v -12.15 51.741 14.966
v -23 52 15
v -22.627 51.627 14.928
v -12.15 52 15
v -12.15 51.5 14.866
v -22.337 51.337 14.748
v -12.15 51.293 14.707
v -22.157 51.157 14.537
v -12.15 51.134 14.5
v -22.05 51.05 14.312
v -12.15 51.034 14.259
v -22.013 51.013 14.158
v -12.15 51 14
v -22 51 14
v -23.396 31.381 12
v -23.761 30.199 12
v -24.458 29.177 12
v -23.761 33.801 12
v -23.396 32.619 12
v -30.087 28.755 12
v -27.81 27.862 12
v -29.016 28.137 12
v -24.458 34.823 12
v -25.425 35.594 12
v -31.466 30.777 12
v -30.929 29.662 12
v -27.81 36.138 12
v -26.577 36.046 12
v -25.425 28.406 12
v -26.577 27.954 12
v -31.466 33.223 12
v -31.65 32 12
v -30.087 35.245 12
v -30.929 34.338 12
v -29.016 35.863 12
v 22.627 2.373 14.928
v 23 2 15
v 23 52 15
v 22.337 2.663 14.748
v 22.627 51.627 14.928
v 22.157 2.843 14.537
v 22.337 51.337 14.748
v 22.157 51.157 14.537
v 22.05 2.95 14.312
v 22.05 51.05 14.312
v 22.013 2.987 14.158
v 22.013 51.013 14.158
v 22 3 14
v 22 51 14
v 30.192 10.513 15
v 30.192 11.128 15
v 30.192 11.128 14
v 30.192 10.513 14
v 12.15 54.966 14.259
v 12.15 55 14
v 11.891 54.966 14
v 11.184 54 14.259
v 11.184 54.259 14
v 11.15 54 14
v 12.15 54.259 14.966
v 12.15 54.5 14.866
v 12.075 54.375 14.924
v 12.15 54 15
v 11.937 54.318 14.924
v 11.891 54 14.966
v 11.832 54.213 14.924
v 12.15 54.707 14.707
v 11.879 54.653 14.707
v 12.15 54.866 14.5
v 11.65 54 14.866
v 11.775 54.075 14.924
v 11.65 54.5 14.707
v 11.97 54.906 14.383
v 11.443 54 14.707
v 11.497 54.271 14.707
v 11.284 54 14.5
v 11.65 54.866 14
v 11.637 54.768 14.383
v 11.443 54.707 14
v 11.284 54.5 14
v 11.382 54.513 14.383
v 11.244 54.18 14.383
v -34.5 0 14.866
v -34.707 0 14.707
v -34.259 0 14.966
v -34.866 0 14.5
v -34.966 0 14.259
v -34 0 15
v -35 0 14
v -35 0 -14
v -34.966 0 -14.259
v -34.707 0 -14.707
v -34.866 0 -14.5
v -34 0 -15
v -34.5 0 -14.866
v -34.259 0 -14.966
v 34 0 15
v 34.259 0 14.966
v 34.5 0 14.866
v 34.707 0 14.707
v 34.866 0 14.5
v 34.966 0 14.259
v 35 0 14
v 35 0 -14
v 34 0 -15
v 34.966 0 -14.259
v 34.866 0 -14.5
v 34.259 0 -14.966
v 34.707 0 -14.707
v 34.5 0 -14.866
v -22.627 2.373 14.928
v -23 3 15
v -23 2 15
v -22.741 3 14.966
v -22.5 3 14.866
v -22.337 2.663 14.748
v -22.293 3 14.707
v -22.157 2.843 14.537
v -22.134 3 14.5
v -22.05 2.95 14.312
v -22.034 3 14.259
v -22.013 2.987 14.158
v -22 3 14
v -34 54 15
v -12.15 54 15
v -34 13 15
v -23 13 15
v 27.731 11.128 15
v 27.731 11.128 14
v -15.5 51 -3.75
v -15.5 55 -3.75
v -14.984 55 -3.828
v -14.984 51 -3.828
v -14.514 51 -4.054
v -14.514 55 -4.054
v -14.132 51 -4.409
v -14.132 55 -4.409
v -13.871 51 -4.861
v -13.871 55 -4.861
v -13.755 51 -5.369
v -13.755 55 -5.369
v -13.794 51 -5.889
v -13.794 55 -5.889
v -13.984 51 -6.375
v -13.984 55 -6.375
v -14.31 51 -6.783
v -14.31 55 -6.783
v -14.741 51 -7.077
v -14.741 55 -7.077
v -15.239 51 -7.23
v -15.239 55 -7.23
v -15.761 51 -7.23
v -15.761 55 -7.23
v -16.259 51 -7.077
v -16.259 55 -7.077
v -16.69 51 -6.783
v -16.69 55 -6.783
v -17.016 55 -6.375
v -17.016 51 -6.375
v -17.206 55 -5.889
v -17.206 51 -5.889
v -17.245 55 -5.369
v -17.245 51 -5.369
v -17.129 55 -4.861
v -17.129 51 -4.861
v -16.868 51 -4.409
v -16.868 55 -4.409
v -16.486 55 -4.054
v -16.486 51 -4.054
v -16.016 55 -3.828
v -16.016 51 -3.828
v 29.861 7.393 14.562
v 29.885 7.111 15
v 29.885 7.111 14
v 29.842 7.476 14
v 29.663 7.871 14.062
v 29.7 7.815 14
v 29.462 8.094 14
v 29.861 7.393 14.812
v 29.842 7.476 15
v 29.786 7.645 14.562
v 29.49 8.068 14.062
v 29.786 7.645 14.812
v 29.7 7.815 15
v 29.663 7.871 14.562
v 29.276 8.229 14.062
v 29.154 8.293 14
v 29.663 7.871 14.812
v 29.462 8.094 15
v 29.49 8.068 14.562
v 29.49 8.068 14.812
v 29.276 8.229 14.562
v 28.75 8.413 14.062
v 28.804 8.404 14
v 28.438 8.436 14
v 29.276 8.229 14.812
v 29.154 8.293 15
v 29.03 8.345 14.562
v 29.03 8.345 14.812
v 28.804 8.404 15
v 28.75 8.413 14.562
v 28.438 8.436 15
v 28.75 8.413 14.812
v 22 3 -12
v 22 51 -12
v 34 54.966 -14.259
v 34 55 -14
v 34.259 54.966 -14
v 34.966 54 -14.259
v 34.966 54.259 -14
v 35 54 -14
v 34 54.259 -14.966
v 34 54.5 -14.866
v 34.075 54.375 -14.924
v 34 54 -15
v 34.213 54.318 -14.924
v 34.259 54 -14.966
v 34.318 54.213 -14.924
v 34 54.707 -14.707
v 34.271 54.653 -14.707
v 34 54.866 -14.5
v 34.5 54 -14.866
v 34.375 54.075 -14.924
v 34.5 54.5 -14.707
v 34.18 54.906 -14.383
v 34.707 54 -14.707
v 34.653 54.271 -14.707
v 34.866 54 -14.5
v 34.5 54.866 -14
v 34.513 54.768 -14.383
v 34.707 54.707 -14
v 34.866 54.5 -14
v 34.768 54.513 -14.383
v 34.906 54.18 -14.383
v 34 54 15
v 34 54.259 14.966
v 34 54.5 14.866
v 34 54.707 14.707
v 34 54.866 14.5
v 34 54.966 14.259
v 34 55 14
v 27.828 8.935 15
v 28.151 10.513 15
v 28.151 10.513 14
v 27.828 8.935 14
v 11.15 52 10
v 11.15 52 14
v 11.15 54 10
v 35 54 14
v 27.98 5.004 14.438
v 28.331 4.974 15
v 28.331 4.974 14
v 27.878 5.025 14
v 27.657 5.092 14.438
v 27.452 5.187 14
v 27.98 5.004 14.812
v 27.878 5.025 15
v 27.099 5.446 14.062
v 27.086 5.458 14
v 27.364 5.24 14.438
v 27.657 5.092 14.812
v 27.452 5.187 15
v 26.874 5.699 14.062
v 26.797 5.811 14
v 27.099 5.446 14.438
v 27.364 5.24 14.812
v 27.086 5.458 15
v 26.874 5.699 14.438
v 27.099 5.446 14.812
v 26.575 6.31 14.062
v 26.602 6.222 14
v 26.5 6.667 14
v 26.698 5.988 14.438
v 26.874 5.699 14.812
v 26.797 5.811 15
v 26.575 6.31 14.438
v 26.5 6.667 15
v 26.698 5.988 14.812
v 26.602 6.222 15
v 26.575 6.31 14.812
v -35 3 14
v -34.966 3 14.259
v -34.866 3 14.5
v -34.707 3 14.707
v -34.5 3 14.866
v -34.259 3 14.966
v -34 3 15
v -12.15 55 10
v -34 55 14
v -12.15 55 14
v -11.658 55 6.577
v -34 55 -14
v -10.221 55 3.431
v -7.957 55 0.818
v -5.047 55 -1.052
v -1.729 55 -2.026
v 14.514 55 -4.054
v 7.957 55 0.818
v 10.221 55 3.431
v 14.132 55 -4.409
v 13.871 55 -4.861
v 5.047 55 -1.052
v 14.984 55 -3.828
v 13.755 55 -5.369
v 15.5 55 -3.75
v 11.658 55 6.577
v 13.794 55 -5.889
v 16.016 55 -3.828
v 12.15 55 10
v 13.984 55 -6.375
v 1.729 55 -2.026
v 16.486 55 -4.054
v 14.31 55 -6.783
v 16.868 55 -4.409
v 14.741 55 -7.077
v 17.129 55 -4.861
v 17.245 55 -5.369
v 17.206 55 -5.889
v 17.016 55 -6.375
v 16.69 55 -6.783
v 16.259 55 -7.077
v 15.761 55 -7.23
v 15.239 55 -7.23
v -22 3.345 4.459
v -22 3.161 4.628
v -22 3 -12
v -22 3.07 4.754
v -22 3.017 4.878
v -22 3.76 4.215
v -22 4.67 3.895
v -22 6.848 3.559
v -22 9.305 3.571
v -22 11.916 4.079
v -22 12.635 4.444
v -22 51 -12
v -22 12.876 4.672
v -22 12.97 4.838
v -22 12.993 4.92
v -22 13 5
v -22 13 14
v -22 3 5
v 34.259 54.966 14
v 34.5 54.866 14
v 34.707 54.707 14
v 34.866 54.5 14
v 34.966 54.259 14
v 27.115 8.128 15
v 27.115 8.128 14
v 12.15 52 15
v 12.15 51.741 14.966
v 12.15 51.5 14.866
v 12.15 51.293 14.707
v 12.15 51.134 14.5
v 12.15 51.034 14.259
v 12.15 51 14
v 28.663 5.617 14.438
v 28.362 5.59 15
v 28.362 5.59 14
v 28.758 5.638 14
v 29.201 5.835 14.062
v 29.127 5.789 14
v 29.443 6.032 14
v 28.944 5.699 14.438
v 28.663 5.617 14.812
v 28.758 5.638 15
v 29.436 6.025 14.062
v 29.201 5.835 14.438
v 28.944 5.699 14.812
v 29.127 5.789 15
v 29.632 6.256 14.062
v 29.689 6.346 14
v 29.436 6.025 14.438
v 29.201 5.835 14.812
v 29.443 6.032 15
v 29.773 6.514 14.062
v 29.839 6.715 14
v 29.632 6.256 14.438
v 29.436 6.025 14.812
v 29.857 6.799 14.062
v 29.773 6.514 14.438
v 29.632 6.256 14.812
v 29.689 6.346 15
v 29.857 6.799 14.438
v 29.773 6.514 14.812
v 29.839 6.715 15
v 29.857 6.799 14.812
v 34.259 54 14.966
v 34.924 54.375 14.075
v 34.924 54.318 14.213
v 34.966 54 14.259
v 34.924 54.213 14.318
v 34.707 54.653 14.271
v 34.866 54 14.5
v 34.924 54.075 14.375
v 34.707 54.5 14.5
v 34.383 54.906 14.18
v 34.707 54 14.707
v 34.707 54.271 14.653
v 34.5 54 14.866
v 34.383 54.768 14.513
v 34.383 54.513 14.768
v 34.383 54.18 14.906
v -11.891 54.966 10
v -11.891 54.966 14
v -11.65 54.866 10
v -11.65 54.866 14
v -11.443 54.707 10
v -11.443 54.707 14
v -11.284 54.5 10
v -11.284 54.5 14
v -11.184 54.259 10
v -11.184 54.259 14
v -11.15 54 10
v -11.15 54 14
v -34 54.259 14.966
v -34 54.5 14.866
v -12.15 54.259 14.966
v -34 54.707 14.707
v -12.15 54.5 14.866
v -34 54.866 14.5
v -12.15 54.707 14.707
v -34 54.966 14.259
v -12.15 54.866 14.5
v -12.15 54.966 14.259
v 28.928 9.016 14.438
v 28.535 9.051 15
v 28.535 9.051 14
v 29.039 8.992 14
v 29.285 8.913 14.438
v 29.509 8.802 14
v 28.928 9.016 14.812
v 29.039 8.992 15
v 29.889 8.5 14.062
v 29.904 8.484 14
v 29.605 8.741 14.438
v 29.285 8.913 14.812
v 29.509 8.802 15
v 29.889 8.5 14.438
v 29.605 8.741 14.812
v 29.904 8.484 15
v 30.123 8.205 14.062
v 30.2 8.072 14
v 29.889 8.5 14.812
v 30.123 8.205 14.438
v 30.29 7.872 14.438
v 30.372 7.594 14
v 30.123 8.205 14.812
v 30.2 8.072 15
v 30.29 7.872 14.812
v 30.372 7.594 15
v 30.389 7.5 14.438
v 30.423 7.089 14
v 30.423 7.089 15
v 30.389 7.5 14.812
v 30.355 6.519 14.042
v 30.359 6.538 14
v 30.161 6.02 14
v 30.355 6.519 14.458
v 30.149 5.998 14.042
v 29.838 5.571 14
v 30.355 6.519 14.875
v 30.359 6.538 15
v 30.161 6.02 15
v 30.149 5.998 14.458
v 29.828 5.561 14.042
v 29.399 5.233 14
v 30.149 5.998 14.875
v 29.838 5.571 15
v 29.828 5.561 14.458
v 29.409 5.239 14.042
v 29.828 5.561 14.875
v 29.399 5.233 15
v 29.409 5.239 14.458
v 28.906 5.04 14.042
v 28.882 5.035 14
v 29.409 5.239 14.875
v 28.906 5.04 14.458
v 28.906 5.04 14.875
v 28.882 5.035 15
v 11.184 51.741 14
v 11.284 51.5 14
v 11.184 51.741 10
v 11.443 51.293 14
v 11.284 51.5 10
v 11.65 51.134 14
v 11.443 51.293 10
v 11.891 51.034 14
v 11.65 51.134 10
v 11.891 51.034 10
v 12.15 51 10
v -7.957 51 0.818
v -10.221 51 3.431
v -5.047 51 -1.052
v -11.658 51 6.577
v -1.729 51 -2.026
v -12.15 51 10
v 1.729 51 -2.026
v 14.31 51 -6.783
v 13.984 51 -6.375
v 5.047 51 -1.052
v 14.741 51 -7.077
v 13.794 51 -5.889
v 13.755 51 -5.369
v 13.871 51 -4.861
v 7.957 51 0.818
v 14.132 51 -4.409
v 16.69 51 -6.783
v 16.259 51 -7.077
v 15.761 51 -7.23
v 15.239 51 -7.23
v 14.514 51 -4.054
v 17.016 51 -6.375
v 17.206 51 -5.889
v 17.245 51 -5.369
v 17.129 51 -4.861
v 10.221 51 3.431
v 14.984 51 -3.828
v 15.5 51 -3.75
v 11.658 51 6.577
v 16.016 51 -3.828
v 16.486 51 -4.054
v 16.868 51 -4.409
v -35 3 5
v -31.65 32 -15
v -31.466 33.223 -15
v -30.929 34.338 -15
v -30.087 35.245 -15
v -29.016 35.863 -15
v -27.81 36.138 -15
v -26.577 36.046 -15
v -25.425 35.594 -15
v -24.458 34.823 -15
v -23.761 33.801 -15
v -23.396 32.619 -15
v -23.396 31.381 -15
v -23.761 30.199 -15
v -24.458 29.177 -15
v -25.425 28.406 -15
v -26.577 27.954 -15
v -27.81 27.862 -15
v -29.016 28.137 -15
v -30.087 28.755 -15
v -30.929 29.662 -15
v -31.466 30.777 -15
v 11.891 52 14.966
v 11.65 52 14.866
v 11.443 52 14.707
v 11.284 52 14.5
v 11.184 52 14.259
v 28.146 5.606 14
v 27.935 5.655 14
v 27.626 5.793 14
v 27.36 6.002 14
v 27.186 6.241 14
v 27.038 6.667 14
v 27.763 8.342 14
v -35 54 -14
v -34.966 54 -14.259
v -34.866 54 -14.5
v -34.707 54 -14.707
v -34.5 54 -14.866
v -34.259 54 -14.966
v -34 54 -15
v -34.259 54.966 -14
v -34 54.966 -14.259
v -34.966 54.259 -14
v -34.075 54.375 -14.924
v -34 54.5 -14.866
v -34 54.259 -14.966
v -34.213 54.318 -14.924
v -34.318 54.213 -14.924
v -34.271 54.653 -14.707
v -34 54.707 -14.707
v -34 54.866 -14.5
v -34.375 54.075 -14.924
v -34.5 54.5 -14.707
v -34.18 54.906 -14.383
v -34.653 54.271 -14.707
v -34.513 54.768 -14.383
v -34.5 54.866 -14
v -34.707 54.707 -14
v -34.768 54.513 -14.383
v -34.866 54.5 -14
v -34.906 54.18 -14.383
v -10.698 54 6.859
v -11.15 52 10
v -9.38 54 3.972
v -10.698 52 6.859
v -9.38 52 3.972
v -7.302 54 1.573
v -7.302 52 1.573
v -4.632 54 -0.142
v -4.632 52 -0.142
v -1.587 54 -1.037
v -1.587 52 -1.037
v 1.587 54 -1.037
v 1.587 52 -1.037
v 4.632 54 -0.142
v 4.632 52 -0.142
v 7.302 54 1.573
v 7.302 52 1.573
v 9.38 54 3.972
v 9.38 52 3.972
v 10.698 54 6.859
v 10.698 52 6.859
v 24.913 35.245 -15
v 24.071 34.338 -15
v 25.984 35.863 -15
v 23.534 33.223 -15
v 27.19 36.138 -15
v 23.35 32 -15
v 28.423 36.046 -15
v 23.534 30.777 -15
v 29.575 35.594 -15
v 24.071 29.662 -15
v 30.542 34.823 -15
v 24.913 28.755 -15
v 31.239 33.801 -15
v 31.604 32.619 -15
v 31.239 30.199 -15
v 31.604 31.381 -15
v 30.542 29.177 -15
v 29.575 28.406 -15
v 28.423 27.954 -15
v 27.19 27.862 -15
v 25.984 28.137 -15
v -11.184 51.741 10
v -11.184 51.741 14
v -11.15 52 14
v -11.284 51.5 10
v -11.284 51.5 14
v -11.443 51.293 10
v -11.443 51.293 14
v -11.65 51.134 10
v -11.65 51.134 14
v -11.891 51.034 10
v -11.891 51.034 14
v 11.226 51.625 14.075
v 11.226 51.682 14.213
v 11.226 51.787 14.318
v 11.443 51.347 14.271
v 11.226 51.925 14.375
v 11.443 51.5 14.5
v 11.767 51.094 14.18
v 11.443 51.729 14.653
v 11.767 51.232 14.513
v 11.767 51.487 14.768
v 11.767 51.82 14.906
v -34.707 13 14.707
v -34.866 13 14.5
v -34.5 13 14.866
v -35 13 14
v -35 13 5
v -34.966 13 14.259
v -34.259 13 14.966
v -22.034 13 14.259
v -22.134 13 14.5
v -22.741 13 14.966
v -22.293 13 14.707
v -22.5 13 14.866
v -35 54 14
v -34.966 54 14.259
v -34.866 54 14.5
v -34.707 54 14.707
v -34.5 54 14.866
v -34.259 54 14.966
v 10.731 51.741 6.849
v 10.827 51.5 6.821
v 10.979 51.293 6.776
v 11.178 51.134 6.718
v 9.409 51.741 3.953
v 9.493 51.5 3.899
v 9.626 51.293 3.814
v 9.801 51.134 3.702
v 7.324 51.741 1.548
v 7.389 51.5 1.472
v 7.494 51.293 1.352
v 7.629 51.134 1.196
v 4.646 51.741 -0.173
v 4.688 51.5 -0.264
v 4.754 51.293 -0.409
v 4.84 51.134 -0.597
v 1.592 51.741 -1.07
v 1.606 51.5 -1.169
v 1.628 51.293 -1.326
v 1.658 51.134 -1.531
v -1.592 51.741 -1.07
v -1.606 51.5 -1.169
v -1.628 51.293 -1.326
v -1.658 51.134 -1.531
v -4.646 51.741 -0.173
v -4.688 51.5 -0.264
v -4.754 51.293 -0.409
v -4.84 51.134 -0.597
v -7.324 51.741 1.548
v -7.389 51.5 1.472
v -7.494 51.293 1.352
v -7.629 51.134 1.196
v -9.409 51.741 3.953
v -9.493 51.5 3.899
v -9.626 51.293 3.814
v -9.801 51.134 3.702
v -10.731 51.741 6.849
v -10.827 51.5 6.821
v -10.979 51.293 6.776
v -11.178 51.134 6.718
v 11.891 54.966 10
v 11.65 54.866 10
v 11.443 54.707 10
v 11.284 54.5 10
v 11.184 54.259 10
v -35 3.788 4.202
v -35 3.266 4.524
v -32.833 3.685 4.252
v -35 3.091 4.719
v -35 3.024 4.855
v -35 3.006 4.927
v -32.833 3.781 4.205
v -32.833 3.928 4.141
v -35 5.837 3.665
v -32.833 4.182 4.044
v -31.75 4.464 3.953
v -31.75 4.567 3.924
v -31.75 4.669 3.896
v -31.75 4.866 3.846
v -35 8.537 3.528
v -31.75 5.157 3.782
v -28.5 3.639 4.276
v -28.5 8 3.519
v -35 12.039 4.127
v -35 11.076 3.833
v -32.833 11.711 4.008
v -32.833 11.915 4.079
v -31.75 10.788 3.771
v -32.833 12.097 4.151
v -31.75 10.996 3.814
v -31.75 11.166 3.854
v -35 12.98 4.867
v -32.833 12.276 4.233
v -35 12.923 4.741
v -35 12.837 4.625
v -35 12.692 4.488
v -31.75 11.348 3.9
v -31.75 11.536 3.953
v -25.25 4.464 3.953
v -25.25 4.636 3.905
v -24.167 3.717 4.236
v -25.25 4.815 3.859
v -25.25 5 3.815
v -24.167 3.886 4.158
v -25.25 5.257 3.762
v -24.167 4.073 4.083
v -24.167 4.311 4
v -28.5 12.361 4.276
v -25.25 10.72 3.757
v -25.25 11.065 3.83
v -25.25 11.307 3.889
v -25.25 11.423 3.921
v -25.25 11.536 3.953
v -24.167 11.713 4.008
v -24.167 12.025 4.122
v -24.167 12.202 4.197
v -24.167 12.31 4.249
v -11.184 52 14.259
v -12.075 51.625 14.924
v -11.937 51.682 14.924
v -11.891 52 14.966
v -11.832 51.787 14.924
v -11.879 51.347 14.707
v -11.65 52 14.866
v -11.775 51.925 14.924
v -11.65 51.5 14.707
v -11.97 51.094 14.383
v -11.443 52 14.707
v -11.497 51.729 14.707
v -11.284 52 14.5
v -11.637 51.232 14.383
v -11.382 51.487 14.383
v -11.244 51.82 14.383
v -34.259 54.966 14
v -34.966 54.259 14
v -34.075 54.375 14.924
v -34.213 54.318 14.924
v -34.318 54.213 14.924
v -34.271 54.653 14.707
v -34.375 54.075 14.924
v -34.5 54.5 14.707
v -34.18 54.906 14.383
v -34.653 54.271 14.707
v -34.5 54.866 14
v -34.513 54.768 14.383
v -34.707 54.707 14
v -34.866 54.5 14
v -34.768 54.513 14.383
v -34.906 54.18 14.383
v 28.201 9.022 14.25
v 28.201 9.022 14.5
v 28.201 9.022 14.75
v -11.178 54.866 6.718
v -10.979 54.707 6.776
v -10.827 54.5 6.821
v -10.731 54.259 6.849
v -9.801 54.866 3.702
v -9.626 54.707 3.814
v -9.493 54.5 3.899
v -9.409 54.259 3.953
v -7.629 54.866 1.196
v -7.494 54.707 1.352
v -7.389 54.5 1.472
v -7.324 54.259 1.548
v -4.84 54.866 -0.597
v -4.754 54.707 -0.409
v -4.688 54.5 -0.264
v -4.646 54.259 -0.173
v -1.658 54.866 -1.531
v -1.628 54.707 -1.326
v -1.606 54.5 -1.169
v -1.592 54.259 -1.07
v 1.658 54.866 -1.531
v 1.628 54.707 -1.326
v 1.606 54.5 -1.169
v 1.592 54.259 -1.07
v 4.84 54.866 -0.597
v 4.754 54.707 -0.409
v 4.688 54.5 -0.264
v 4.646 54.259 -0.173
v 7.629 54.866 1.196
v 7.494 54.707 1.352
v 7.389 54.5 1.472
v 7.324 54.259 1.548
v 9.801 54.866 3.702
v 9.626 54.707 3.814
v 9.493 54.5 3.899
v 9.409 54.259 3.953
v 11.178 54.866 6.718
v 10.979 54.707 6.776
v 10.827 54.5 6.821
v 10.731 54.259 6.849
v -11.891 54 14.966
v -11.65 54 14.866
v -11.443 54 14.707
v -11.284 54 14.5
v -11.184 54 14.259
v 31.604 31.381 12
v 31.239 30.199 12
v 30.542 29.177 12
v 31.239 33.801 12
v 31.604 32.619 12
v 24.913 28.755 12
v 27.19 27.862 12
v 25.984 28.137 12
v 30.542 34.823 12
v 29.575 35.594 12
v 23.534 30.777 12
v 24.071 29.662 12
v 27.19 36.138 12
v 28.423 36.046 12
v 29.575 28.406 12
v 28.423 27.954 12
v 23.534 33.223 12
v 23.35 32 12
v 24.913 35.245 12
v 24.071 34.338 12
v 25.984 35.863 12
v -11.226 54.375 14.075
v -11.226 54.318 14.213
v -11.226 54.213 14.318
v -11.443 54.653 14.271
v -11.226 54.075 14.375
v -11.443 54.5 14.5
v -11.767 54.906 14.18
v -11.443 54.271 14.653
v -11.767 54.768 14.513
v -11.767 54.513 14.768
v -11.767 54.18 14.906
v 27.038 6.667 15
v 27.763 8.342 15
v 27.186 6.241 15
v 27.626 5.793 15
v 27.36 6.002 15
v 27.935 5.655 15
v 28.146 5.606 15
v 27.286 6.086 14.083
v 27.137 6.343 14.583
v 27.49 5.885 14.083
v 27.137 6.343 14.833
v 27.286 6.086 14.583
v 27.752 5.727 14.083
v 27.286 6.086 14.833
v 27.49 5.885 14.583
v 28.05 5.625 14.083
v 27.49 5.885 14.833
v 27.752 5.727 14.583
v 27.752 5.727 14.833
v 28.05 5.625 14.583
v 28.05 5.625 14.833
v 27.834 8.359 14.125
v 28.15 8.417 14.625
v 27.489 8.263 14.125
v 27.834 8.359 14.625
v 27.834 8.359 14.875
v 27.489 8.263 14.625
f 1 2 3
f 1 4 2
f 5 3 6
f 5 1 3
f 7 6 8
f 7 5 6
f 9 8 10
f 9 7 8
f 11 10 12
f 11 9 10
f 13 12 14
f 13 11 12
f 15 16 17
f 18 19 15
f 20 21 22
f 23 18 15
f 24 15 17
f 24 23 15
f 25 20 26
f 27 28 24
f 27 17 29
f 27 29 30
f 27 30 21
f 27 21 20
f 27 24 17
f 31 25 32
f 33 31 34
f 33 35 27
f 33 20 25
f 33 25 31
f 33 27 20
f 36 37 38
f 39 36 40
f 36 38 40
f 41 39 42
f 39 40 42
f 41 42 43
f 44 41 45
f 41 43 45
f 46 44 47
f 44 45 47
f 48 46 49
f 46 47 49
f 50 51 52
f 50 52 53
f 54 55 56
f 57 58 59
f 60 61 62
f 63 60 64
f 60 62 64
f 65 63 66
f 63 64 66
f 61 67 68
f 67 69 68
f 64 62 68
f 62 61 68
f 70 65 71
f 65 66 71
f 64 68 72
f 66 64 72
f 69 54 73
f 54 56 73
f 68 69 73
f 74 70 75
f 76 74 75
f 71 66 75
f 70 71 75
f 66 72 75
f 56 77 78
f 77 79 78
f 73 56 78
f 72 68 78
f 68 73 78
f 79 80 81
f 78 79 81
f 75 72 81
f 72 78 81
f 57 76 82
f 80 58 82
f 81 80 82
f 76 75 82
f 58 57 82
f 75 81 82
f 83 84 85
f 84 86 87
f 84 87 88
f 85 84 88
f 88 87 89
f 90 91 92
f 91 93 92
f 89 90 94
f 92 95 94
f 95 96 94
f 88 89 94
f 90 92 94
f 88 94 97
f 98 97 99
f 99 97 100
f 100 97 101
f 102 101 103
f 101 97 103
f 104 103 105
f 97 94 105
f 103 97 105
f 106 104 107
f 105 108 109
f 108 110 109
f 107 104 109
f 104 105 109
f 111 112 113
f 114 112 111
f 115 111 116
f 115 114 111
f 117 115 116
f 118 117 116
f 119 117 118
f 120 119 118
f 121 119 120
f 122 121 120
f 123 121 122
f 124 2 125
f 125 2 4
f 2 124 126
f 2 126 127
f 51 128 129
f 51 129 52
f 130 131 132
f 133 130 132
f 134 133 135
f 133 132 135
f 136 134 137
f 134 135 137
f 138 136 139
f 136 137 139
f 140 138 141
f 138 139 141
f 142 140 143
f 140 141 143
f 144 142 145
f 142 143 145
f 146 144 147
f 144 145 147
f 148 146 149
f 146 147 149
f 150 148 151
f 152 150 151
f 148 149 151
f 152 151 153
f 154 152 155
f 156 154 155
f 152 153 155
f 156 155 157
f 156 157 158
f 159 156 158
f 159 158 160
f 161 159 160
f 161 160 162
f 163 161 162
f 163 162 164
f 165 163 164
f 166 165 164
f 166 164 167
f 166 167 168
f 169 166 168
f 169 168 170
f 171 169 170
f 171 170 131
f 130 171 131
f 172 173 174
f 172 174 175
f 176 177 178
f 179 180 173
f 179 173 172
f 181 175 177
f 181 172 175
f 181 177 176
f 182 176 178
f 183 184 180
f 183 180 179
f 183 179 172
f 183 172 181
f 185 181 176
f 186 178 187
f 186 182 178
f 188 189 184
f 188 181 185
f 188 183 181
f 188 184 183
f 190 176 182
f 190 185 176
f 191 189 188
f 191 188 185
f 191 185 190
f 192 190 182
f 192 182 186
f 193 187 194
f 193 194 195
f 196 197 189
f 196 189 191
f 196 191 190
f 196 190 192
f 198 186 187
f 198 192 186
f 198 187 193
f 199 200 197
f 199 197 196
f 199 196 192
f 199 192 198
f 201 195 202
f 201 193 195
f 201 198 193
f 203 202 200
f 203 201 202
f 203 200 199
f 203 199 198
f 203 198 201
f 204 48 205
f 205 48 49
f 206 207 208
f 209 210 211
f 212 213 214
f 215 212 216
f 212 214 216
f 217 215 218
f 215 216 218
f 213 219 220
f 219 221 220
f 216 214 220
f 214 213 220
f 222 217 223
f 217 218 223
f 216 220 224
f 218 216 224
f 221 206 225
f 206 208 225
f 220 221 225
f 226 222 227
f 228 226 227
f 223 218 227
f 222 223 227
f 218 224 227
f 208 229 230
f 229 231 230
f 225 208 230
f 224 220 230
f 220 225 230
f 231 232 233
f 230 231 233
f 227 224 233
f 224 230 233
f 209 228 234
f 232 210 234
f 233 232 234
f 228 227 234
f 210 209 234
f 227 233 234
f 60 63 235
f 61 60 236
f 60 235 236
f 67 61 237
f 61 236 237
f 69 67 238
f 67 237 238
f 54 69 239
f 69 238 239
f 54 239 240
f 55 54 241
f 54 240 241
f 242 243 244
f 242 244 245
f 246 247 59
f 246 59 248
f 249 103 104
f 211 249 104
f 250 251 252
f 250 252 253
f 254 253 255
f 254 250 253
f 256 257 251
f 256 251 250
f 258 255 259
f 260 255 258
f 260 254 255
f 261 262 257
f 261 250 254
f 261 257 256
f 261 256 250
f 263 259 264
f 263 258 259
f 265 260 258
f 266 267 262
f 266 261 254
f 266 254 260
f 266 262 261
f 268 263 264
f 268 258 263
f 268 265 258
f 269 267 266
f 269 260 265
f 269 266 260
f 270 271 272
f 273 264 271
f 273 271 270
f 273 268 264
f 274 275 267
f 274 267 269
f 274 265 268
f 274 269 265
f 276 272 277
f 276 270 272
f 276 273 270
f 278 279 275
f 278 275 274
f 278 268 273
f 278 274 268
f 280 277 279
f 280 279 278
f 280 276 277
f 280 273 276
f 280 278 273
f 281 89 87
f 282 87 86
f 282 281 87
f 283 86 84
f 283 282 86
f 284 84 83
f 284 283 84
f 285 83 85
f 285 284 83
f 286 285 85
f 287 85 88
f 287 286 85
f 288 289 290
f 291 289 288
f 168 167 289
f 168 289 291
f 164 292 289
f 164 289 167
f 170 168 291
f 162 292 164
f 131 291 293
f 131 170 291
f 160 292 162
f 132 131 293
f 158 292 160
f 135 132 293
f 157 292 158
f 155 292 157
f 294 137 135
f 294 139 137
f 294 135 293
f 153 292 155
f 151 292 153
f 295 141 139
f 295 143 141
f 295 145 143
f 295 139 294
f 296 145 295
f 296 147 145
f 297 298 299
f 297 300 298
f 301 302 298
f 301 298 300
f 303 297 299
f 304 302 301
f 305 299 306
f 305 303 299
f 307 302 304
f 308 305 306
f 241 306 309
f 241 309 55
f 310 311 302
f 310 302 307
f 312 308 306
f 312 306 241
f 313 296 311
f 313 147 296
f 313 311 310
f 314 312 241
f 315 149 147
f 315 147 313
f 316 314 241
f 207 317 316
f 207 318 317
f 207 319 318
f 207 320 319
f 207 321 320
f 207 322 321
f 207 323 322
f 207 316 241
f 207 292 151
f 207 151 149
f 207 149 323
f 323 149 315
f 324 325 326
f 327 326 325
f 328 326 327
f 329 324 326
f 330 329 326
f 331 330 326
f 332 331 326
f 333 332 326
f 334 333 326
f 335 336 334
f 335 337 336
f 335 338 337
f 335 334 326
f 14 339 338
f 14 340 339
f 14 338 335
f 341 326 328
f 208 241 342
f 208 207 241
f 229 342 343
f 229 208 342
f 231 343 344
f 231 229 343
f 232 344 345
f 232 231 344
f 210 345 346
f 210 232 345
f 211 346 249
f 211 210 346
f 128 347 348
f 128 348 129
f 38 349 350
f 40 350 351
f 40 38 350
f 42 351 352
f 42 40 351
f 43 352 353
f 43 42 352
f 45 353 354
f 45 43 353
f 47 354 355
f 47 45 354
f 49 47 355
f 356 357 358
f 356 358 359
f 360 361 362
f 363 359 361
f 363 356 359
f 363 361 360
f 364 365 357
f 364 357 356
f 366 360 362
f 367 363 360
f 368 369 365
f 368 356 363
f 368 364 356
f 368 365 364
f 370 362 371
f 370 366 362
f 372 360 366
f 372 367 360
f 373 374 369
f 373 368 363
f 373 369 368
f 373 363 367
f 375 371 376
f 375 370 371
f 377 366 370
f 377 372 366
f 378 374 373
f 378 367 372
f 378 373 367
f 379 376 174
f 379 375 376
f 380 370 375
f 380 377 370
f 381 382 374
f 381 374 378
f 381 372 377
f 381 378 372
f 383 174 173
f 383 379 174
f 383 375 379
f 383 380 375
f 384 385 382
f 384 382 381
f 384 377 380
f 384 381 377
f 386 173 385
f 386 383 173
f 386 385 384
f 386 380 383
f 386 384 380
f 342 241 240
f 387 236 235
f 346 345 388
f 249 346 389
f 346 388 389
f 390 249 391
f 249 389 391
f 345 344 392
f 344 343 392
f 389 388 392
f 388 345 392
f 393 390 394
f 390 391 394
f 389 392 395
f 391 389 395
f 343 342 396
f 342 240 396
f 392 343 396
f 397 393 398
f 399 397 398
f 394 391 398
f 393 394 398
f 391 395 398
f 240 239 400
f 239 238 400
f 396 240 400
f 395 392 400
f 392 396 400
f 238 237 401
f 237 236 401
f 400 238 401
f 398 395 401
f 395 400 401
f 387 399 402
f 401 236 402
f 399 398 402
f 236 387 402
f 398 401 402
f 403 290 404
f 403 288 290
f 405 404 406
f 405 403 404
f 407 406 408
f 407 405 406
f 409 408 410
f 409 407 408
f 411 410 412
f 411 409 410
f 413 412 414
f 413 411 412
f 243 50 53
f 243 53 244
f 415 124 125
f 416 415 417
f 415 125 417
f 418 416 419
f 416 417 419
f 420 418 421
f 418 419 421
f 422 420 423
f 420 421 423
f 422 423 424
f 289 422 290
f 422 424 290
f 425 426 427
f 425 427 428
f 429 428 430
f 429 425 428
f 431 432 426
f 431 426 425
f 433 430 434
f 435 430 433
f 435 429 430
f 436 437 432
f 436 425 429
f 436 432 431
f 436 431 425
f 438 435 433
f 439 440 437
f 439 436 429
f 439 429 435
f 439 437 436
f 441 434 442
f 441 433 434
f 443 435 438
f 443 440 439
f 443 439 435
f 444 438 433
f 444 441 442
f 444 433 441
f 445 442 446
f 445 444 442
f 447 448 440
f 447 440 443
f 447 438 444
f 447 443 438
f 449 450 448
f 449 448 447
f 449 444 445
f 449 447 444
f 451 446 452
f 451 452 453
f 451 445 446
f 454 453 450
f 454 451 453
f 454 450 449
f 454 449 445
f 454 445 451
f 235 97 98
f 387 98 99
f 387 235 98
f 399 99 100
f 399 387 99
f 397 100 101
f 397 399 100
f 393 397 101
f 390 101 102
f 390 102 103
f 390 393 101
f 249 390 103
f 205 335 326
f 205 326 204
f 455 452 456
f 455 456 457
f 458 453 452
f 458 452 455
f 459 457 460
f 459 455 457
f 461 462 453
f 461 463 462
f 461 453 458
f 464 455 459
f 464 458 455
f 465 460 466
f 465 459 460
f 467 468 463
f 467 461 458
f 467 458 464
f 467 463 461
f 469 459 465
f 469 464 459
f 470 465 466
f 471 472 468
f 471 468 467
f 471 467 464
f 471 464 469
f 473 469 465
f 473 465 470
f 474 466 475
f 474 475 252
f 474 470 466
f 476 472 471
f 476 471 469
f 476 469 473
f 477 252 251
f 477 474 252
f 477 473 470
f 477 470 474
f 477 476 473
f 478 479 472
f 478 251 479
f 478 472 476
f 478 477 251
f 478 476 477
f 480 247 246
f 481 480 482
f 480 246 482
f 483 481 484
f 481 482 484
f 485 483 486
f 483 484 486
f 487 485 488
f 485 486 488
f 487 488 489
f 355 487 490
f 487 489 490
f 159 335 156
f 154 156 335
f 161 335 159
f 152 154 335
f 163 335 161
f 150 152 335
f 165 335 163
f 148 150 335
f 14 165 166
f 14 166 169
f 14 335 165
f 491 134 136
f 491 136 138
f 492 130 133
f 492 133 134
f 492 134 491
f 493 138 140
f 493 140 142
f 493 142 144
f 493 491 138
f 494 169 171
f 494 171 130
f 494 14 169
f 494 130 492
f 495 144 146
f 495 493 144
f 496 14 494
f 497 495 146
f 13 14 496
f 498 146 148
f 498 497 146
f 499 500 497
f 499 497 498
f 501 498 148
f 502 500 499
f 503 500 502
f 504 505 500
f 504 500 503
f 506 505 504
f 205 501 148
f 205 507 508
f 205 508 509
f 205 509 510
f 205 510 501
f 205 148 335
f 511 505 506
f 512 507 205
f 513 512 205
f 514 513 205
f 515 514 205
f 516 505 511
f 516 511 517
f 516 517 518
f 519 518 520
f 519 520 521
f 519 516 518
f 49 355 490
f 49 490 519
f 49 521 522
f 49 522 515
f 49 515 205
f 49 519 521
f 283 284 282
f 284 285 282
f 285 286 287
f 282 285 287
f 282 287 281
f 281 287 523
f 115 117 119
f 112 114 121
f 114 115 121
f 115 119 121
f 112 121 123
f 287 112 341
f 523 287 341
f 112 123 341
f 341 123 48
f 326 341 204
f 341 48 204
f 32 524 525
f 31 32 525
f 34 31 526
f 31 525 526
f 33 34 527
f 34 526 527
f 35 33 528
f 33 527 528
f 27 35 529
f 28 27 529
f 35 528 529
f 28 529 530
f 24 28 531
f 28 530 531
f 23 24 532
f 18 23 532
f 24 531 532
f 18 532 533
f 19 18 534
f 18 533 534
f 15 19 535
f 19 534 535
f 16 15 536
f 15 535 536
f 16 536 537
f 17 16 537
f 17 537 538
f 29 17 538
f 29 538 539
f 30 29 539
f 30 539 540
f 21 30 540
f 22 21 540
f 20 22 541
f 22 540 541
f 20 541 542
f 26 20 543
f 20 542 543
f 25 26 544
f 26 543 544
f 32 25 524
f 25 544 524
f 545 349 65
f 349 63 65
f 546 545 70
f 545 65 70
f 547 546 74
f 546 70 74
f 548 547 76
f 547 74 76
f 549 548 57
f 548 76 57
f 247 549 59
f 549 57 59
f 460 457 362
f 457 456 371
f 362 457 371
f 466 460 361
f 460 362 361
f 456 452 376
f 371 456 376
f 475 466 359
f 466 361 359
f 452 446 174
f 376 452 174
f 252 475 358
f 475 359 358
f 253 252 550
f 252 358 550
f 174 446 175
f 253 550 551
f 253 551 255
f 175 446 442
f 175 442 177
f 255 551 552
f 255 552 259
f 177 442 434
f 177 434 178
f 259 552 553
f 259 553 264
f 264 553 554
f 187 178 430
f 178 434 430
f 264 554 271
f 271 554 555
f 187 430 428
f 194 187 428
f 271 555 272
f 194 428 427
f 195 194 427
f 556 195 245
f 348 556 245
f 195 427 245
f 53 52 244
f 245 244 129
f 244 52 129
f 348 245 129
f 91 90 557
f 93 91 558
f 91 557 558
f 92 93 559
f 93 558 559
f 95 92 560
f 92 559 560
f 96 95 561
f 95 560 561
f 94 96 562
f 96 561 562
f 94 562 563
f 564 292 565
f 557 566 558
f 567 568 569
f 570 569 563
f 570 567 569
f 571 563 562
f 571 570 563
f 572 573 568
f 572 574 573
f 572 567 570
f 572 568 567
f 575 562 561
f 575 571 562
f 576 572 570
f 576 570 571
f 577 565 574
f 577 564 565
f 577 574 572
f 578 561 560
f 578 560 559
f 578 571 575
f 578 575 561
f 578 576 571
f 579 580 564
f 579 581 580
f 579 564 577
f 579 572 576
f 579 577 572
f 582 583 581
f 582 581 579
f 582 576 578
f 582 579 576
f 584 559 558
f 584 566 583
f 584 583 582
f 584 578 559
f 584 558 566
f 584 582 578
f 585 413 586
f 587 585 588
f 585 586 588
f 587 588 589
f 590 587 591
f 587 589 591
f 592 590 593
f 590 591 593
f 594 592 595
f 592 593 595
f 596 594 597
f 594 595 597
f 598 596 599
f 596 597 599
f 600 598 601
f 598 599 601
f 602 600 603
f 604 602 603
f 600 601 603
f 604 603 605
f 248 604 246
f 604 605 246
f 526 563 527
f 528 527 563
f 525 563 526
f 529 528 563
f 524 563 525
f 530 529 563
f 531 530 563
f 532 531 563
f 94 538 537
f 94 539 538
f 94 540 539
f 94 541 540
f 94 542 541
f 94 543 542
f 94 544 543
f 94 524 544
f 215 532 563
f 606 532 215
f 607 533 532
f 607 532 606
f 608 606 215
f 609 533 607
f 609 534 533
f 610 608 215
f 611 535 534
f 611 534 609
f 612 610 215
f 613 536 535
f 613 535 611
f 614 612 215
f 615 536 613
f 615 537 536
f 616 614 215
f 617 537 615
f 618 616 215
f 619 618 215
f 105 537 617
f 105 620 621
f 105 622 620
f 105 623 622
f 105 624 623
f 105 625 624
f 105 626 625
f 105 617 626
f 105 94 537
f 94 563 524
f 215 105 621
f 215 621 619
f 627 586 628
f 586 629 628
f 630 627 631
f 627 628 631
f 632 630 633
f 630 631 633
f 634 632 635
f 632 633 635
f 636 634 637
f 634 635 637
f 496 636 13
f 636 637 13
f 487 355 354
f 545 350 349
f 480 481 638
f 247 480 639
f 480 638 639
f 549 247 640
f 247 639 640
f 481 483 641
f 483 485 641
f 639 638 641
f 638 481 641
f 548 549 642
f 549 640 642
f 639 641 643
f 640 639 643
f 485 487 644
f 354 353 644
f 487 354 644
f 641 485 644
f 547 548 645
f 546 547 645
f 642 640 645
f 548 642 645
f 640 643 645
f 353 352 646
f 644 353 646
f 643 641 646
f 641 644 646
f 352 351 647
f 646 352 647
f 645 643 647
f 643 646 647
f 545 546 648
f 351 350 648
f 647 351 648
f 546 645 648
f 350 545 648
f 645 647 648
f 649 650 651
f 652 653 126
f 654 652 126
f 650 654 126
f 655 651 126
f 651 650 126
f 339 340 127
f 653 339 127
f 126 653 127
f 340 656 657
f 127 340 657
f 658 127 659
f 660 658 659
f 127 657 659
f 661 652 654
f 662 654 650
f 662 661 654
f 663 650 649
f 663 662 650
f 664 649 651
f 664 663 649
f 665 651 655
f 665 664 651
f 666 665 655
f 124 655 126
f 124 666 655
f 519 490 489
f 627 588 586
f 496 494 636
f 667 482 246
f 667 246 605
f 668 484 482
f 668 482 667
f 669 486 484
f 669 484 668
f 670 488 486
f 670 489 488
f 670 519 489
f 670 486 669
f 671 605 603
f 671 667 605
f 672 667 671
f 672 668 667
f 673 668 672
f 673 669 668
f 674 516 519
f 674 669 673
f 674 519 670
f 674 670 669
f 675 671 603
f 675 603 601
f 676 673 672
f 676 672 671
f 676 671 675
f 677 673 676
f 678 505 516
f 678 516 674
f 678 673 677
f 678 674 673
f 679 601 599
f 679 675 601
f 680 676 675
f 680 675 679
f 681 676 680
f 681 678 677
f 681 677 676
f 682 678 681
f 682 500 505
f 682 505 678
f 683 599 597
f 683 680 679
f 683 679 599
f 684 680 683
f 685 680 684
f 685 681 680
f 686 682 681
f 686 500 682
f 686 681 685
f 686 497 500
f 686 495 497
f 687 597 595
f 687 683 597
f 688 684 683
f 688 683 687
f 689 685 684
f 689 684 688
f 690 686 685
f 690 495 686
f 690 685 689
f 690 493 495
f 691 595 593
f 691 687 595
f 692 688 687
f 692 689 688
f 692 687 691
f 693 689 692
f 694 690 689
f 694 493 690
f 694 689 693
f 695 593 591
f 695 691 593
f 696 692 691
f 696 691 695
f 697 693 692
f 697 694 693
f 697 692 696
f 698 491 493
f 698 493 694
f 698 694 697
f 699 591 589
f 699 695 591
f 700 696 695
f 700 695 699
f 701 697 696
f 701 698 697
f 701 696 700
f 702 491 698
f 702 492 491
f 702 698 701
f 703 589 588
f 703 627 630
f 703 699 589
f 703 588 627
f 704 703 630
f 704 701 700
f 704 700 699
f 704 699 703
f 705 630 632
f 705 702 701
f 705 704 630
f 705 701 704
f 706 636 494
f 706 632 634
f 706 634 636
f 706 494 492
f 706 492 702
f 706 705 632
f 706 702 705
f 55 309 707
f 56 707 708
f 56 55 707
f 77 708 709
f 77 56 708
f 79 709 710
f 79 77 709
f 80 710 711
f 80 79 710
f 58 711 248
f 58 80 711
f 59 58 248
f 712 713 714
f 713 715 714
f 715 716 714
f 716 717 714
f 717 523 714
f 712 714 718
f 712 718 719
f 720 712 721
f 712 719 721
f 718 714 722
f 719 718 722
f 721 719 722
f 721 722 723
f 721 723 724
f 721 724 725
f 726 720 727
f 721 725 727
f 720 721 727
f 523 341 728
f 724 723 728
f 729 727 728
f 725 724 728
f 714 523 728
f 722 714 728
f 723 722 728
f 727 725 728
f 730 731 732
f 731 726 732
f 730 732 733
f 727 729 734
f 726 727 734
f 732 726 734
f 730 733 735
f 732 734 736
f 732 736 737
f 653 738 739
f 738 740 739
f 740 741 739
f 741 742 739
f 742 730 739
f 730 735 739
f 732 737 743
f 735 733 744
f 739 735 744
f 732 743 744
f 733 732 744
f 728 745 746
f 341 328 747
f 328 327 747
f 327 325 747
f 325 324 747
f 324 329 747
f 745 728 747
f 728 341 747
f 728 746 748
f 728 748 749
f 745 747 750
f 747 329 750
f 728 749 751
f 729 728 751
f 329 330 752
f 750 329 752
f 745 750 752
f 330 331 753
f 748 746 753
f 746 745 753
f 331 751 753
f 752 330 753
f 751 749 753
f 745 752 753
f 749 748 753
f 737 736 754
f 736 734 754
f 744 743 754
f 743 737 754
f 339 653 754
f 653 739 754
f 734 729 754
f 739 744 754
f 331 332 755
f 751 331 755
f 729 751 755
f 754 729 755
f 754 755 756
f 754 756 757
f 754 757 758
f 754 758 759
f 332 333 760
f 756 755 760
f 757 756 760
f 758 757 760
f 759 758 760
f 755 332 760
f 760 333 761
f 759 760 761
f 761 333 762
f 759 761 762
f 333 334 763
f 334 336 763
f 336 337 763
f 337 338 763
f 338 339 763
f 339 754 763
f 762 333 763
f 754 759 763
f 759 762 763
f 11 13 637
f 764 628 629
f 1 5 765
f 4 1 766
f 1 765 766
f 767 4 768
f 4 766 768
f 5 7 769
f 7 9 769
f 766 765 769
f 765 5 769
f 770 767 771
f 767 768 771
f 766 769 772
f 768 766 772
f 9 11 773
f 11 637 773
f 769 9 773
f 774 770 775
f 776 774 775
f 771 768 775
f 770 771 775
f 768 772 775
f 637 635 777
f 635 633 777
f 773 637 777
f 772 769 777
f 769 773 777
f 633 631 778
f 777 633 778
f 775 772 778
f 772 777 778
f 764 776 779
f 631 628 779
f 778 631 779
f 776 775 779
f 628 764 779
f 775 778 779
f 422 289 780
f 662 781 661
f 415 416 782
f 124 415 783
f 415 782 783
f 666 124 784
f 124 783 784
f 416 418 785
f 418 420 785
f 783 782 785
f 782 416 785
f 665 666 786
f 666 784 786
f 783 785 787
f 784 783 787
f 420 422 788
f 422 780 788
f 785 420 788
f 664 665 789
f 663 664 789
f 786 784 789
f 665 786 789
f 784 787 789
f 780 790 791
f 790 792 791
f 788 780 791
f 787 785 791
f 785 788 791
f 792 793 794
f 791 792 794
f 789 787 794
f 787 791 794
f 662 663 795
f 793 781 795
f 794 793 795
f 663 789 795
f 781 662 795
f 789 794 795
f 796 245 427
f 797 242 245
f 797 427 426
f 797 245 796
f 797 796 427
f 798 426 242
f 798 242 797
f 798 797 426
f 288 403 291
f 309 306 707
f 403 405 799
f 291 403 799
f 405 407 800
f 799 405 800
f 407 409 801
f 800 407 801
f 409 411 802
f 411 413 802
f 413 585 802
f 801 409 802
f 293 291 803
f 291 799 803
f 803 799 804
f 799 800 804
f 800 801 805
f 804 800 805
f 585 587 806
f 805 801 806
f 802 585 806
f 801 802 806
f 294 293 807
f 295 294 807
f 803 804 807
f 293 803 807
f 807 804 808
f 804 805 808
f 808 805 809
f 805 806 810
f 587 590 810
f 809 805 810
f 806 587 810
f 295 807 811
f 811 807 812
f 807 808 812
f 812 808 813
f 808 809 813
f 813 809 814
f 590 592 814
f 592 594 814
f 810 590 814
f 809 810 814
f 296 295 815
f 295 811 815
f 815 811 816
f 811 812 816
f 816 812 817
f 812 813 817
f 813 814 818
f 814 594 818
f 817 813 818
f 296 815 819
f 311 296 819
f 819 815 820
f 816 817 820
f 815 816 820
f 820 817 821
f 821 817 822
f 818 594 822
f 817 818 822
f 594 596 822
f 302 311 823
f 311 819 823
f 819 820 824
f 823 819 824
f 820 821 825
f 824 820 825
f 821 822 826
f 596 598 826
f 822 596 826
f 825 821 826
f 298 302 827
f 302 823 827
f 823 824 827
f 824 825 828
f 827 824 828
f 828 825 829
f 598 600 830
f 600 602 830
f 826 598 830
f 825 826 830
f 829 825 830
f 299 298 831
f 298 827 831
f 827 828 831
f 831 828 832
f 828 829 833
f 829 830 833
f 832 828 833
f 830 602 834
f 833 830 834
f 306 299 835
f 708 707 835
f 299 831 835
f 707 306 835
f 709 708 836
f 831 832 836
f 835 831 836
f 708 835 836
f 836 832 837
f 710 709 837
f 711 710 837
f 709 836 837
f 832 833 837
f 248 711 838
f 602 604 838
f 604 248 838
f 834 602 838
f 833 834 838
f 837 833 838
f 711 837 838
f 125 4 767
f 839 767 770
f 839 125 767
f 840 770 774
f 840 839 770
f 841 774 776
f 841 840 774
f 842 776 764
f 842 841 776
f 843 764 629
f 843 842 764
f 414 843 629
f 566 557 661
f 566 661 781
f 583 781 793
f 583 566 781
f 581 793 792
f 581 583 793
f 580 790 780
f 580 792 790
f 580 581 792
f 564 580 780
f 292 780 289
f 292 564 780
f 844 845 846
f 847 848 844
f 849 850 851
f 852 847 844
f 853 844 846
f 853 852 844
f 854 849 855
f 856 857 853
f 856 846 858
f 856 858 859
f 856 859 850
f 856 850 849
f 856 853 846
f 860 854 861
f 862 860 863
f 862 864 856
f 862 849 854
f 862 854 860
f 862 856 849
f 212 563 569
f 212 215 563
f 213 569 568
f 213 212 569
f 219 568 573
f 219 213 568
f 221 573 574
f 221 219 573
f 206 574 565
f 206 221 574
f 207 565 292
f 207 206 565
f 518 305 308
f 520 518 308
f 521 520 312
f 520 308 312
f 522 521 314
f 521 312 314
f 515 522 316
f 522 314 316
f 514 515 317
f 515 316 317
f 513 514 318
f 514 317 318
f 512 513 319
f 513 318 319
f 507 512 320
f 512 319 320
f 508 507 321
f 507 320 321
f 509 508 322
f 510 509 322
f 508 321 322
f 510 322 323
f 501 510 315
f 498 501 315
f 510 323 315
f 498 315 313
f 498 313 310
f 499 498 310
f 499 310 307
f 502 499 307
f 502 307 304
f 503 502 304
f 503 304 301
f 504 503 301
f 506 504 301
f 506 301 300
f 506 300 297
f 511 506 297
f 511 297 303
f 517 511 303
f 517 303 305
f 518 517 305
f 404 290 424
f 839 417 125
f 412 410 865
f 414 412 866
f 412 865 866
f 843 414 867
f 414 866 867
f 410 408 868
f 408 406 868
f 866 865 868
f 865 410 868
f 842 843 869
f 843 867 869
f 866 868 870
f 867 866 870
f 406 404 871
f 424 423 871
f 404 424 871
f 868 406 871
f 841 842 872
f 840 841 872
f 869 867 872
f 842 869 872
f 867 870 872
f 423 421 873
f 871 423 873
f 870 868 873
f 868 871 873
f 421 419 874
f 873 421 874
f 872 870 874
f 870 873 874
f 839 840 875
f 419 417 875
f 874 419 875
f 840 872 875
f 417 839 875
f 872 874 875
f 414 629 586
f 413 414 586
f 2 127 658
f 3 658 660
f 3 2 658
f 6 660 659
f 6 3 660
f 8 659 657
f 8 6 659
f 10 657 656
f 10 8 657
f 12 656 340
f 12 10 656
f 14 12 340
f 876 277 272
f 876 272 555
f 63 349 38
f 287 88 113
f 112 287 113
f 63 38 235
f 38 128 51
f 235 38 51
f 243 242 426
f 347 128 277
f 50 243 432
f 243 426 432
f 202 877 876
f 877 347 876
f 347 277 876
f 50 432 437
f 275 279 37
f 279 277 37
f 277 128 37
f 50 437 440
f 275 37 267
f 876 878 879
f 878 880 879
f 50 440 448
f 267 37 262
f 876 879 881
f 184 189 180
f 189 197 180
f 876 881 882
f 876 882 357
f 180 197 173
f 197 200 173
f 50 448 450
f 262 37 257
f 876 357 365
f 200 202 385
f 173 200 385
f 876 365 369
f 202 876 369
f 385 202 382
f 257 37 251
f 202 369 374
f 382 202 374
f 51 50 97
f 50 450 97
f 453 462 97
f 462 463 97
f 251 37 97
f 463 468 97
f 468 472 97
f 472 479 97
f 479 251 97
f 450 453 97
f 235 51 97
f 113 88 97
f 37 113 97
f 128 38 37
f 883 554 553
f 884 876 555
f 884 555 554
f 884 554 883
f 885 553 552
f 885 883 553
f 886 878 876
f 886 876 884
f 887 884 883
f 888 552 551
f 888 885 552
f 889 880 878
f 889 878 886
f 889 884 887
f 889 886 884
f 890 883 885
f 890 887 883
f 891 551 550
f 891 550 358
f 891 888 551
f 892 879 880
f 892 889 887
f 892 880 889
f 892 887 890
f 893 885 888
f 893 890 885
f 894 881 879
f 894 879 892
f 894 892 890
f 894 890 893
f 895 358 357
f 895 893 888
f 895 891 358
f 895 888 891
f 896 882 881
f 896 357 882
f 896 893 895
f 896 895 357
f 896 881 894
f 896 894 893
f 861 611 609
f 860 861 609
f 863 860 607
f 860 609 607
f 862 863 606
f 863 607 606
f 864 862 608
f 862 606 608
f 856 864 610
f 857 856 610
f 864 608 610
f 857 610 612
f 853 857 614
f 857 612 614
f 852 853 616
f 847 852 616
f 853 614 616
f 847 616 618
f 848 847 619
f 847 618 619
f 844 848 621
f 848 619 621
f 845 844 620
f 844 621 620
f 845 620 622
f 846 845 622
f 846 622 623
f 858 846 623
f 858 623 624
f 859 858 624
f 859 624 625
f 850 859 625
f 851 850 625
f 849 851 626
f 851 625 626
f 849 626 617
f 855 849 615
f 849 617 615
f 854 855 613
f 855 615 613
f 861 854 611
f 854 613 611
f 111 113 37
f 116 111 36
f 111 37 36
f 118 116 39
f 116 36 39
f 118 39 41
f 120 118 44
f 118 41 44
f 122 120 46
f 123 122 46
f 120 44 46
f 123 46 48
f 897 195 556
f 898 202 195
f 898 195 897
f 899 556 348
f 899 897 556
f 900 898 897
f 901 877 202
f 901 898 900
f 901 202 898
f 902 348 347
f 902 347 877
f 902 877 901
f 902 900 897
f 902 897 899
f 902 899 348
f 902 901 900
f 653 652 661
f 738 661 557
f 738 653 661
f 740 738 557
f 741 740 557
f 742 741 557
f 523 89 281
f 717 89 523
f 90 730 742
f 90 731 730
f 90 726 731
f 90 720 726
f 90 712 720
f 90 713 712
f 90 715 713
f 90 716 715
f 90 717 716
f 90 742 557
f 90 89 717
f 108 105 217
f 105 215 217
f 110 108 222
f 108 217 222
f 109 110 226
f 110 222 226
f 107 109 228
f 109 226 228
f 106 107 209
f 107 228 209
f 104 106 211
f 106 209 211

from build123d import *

# Parameters (mm, degrees)
CROQUIS1_W              = 70
CROQUIS1_H              = 30
SALIENTE_EXTRUIR1_DEPTH = 55
CROQUIS5_W              = 44
CROQUIS5_H              = 48
CORTAR_EXTRUIR3_DEPTH   = 27
CORTAR_EXTRUIR4_REACH   = 65.647
CROQUIS6_R              = 11.15
CORTAR_EXTRUIR5_START   = -4
CROQUIS7_W              = 22.3
CROQUIS7_H              = 5
CORTAR_EXTRUIR5_DEPTH   = 4
CROQUIS9_R              = 4.15
CORTAR_EXTRUIR6_DEPTH   = 27
REDONDEO1_R             = 1
CORTAR_EXTRUIR7_DEPTH   = 1
CORTAR_EXTRUIR8_REACH   = 68.895
CROQUIS11_R             = 1.75
CORTAR_EXTRUIR9_REACH   = 82.616


with BuildPart() as part:
    # Croquis1 → Saliente-Extruir1 (new body)
    with BuildSketch(Plane(origin=(0, 0, 0), x_dir=(1, 0, 0), z_dir=(0, 1, 0))):
        Rectangle(CROQUIS1_W, CROQUIS1_H)
    extrude(amount=SALIENTE_EXTRUIR1_DEPTH)

    # Croquis5 → Cortar-Extruir3 (cut)
    with BuildSketch(Plane.XY.offset(15)):
        with Locations((0, 27)):
            Rectangle(CROQUIS5_W, CROQUIS5_H)
    extrude(amount=-CORTAR_EXTRUIR3_DEPTH, mode=Mode.SUBTRACT)

    # Croquis6 → Cortar-Extruir4 (cut, up to next)
    with BuildSketch(Plane.XZ.offset(-51), mode=Mode.PRIVATE) as cortar_extruir4_sk1:
        with Locations((0, 10)):
            Circle(CROQUIS6_R)
    cortar_extruir4_tool1 = extrude(cortar_extruir4_sk1.sketch, amount=-CORTAR_EXTRUIR4_REACH, mode=Mode.PRIVATE) & part.part
    add(cortar_extruir4_tool1.solids().sort_by_distance((0, 51, 10))[0], mode=Mode.SUBTRACT)

    # Croquis7 → Cortar-Extruir5 (cut)
    with BuildSketch(Plane(origin=(0, 55, 0), x_dir=(1, 0, 0), z_dir=(0, 1, 0)).offset(CORTAR_EXTRUIR5_START)):
        with Locations((0, -12.5)):
            Rectangle(CROQUIS7_W, CROQUIS7_H)
    extrude(amount=CORTAR_EXTRUIR5_DEPTH, mode=Mode.SUBTRACT)

    # Croquis9 → Cortar-Extruir6 (cut)
    with BuildSketch(Plane(origin=(0, 0, -15), x_dir=(-1, 0, 0), z_dir=(0, 0, -1))):
        with Locations((-27.5, 32)):
            Circle(CROQUIS9_R)
        with Locations((27.5, 32)):
            Circle(CROQUIS9_R)
    extrude(amount=-CORTAR_EXTRUIR6_DEPTH, mode=Mode.SUBTRACT)

    # Redondeo1
    redondeo1_edges = [part.edges().sort_by_distance(p)[0] for p in [
        (-35, 55, 0),
        (-23.075, 55, 15),
        (-22, 27, 15),
        (0, 3, 15),
        (22, 27, 15),
        (16.575, 51, 15),
        (0, 55, -1.15),
        (23.075, 55, 15),
        (11.15, 51, 12.5),
        (35, 55, 0),
        (11.15, 55, 12.5),
        (11.15, 53, 15),
        (0, 51, -1.15),
        (-16.575, 51, 15),
        (-11.15, 51, 12.5),
        (-11.15, 55, 12.5),
        (-11.15, 53, 15),
        (0, 55, -15),
        (35, 27.5, 15),
        (-35, 27.5, 15),
        (-35, 27.5, -15),
        (35, 27.5, -15),
    ]]
    fillet(redondeo1_edges, radius=REDONDEO1_R)

    # Croquis10 → Cortar-Extruir7 (cut)
    with BuildSketch(Plane.XY.offset(15)):
        with BuildLine():
            Line((30.192307692, 11.128219757), (30.192307692, 10.512835142))
            Line((30.192307692, 10.512835142), (28.151442308, 10.512835142))
            Line((28.151442308, 10.512835142), (27.828125, 8.934710142))
            add(Edge.make_bspline(
                [(27.828125, 8.934710142), (27.891649356, 8.952247751), (28.014717749, 8.986224094), (28.196363225, 9.023948272), (28.368807002, 9.046689033), (28.480707637, 9.049794137), (28.534855769, 9.05129668)],
                knots=[0, 0, 0, 0, 1.100273476, 2.13160584, 3.095893838, 4, 4, 4, 4], degree=3))
            add(Edge.make_bspline(
                [(28.534855769, 9.05129668), (28.601856466, 9.049846505), (28.733596576, 9.046995098), (28.926349056, 9.019614784), (29.110348302, 8.976517788), (29.285209508, 8.916311179), (29.451256166, 8.839323065), (29.606960557, 8.743151739), (29.754659836, 8.630808885), (29.891704283, 8.501646008), (30.016031669, 8.359494665), (30.125344794, 8.2066526), (30.218194949, 8.044605179), (30.292870528, 7.871804136), (30.352500816, 7.690159873), (30.39218995, 7.49776116), (30.418618594, 7.296421525), (30.421571256, 7.158756548), (30.423076923, 7.088556296)],
                knots=[0, 0, 0, 0, 1.052922333, 2.070308379, 3.05430497, 4.020497103, 4.973039431, 5.925935799, 6.892292201, 7.88610001, 8.88166317, 9.857072816, 10.836096531, 11.812156883, 12.81219415, 13.836441305, 14.89672472, 16, 16, 16, 16], degree=3))
            add(Edge.make_bspline(
                [(30.423076923, 7.088556296), (30.421936794, 7.039661061), (30.419671944, 6.942531368), (30.408154365, 6.798284167), (30.385978852, 6.657090739), (30.35620561, 6.518932353), (30.317561465, 6.384070572), (30.27078023, 6.252119381), (30.213529897, 6.123900055), (30.150733254, 5.998199378), (30.080025006, 5.87785908), (30.001547565, 5.76531796), (29.918635294, 5.658887763), (29.82942149, 5.559709935), (29.733076927, 5.46843619), (29.630768413, 5.384524851), (29.523312323, 5.306556856), (29.409046193, 5.237697093), (29.290516222, 5.174332025), (29.166010707, 5.122348818), (29.038363792, 5.075873627), (28.905738291, 5.038828723), (28.768434612, 5.009801486), (28.626226426, 4.990086171), (28.479859563, 4.975726564), (28.380645256, 4.974827666), (28.330528846, 4.974373604)],
                knots=[0, 0, 0, 0, 1.056347294, 2.098418968, 3.122841568, 4.141288669, 5.149314143, 6.15115421, 7.162517403, 8.180376062, 9.185164535, 10.17417709, 11.141909838, 12.097768115, 13.052685741, 14.0056014, 14.954263652, 15.917497458, 16.885230207, 17.854509472, 18.828990115, 19.81800267, 20.826176721, 21.857883937, 22.917946725, 24, 24, 24, 24], degree=3))
            add(Edge.make_bspline(
                [(28.330528846, 4.974373604), (28.270744536, 4.975557897), (28.153125969, 4.977887855), (27.980804997, 5.002262401), (27.81500853, 5.037171972), (27.657071214, 5.089691292), (27.505577619, 5.155498083), (27.362567246, 5.238668663), (27.224385916, 5.332918555), (27.096650995, 5.444142017), (26.978097658, 5.565711758), (26.871972214, 5.697639142), (26.777457511, 5.837746757), (26.696067088, 5.986715022), (26.626641908, 6.144152503), (26.572101929, 6.310649076), (26.528081891, 6.485334797), (26.509458885, 6.605597958), (26.5, 6.666681296)],
                knots=[0, 0, 0, 0, 1.0467383, 2.05933395, 3.04377827, 4.011590433, 4.970194871, 5.932262533, 6.905835911, 7.896367577, 8.894135286, 9.877477877, 10.858688626, 11.851381753, 12.8477658, 13.868841284, 14.917554742, 16, 16, 16, 16], degree=3))
            Line((26.5, 6.666681296), (27.038461538, 6.666681296))
            add(Edge.make_bspline(
                [(27.038461538, 6.666681296), (27.051710494, 6.60946452), (27.077175722, 6.4994907), (27.133071291, 6.34497983), (27.201412792, 6.207289732), (27.28267739, 6.084599018), (27.379620299, 5.977612165), (27.490242177, 5.88226863), (27.614266845, 5.796254123), (27.75208381, 5.724557951), (27.897477661, 5.663411516), (28.049650021, 5.622694325), (28.204457472, 5.594064223), (28.309163249, 5.591198347), (28.361778846, 5.589758219)],
                knots=[0, 0, 0, 0, 1.136247022, 2.183929868, 3.172523383, 4.106158343, 5.02341133, 5.958108904, 6.928429099, 7.938127109, 8.96079061, 9.975095812, 10.982467395, 12, 12, 12, 12], degree=3))
            add(Edge.make_bspline(
                [(28.361778846, 5.589758219), (28.413136179, 5.591165267), (28.514259189, 5.593935755), (28.663078709, 5.615259776), (28.806757922, 5.648101327), (28.943879105, 5.69724965), (29.076841744, 5.756983453), (29.202282493, 5.833637869), (29.323830283, 5.921855043), (29.437707083, 6.022923552), (29.542003282, 6.134300171), (29.634156632, 6.253404274), (29.710917055, 6.380461725), (29.775604099, 6.513272844), (29.82472404, 6.653293228), (29.859765722, 6.799866671), (29.880342394, 6.953355209), (29.883172989, 7.058045454), (29.884615385, 7.111392834)],
                knots=[0, 0, 0, 0, 1.027316725, 2.022795036, 3.002884548, 3.971462791, 4.93288096, 5.914575861, 6.907176829, 7.935150275, 8.956128384, 9.956726525, 10.942570165, 11.921478529, 12.907843606, 13.90538589, 14.932640048, 16, 16, 16, 16], degree=3))
            add(Edge.make_bspline(
                [(29.884615385, 7.111392834), (29.883486563, 7.159522694), (29.881277054, 7.253730047), (29.863224648, 7.391557258), (29.831824124, 7.521968188), (29.78824033, 7.645592589), (29.732904031, 7.762547061), (29.665281781, 7.872952307), (29.584104528, 7.975353164), (29.491375576, 8.069797542), (29.389790363, 8.156960185), (29.27760109, 8.231264333), (29.157155501, 8.293773906), (29.029904759, 8.347719046), (28.892822076, 8.386463181), (28.748622134, 8.415550985), (28.595747778, 8.432377321), (28.491226598, 8.434711986), (28.4375, 8.435912065)],
                knots=[0, 0, 0, 0, 1.045622112, 2.046656509, 3.013763289, 3.955457236, 4.890082067, 5.820317437, 6.762574623, 7.722996705, 8.69280354, 9.665887285, 10.63943826, 11.638615906, 12.663482002, 13.728887084, 14.832589034, 16, 16, 16, 16], degree=3))
            add(Edge.make_bspline(
                [(28.4375, 8.435912065), (28.390993265, 8.434916766), (28.294968656, 8.432861726), (28.147672381, 8.417730588), (27.992886571, 8.393320369), (27.831204578, 8.359743945), (27.66214085, 8.315804956), (27.486052163, 8.263151527), (27.302568277, 8.200199529), (27.178937893, 8.152658591), (27.115384615, 8.128219757)],
                knots=[0, 0, 0, 0, 0.817624296, 1.688186739, 2.600797293, 3.572016777, 4.590301741, 5.671205678, 6.80286297, 8, 8, 8, 8], degree=3))
            Line((27.115384615, 8.128219757), (27.730769231, 11.128219757))
            Line((27.730769231, 11.128219757), (30.192307692, 11.128219757))
        make_face()
    extrude(amount=-CORTAR_EXTRUIR7_DEPTH, mode=Mode.SUBTRACT)

    # Croquis11 → Cortar-Extruir8 (cut, up to next)
    with BuildSketch(Plane(origin=(0, 55, 0), x_dir=(1, 0, 0), z_dir=(0, 1, 0)), mode=Mode.PRIVATE) as cortar_extruir8_sk1:
        with Locations(Location((-15.5, 5.5, 0), (0, 0, 270))):
            Circle(CROQUIS11_R)
    cortar_extruir8_tool1 = extrude(cortar_extruir8_sk1.sketch, amount=-CORTAR_EXTRUIR8_REACH, mode=Mode.PRIVATE) & part.part
    # Croquis11 → Cortar-Extruir8 (cut, up to next)
    with BuildSketch(Plane(origin=(0, 55, 0), x_dir=(1, 0, 0), z_dir=(0, 1, 0)), mode=Mode.PRIVATE) as cortar_extruir8_sk2:
        with Locations(Location((15.5, 5.5, 0), (0, 0, 270))):
            Circle(CROQUIS11_R)
    cortar_extruir8_tool2 = extrude(cortar_extruir8_sk2.sketch, amount=-CORTAR_EXTRUIR8_REACH, mode=Mode.PRIVATE) & part.part
    add(cortar_extruir8_tool1.solids().sort_by_distance((-15.5, 55, -5.5))[0], mode=Mode.SUBTRACT)
    add(cortar_extruir8_tool2.solids().sort_by_distance((15.5, 55, -5.5))[0], mode=Mode.SUBTRACT)

    # Croquis14 → Cortar-Extruir9 (cut, up to next)
    with BuildSketch(Plane(origin=(-22, 0, 0), x_dir=(0, 0, -1), z_dir=(1, 0, 0)), mode=Mode.PRIVATE) as cortar_extruir9_sk1:
        with BuildLine():
            Line((-15, 3), (-5, 3))
            add(Edge.make_bspline(
                [(-5, 3), (-3.519296534, 3), (-3.519296534, 8), (-3.519296534, 13), (-5, 13)],
                knots=[3.141592654, 3.141592654, 3.141592654, 4.71238898, 4.71238898, 6.283185307, 6.283185307, 6.283185307], degree=2, weights=[1, 0.707106781, 1, 0.707106781, 1]))
            Line((-5, 13), (-15, 13))
            Line((-15, 13), (-15, 3))
        make_face()
    cortar_extruir9_tool1 = extrude(cortar_extruir9_sk1.sketch, amount=-CORTAR_EXTRUIR9_REACH, mode=Mode.PRIVATE) & part.part
    add(cortar_extruir9_tool1.solids().sort_by_distance((-22, 8, 9.413236))[0], mode=Mode.SUBTRACT)


solid = part.part
